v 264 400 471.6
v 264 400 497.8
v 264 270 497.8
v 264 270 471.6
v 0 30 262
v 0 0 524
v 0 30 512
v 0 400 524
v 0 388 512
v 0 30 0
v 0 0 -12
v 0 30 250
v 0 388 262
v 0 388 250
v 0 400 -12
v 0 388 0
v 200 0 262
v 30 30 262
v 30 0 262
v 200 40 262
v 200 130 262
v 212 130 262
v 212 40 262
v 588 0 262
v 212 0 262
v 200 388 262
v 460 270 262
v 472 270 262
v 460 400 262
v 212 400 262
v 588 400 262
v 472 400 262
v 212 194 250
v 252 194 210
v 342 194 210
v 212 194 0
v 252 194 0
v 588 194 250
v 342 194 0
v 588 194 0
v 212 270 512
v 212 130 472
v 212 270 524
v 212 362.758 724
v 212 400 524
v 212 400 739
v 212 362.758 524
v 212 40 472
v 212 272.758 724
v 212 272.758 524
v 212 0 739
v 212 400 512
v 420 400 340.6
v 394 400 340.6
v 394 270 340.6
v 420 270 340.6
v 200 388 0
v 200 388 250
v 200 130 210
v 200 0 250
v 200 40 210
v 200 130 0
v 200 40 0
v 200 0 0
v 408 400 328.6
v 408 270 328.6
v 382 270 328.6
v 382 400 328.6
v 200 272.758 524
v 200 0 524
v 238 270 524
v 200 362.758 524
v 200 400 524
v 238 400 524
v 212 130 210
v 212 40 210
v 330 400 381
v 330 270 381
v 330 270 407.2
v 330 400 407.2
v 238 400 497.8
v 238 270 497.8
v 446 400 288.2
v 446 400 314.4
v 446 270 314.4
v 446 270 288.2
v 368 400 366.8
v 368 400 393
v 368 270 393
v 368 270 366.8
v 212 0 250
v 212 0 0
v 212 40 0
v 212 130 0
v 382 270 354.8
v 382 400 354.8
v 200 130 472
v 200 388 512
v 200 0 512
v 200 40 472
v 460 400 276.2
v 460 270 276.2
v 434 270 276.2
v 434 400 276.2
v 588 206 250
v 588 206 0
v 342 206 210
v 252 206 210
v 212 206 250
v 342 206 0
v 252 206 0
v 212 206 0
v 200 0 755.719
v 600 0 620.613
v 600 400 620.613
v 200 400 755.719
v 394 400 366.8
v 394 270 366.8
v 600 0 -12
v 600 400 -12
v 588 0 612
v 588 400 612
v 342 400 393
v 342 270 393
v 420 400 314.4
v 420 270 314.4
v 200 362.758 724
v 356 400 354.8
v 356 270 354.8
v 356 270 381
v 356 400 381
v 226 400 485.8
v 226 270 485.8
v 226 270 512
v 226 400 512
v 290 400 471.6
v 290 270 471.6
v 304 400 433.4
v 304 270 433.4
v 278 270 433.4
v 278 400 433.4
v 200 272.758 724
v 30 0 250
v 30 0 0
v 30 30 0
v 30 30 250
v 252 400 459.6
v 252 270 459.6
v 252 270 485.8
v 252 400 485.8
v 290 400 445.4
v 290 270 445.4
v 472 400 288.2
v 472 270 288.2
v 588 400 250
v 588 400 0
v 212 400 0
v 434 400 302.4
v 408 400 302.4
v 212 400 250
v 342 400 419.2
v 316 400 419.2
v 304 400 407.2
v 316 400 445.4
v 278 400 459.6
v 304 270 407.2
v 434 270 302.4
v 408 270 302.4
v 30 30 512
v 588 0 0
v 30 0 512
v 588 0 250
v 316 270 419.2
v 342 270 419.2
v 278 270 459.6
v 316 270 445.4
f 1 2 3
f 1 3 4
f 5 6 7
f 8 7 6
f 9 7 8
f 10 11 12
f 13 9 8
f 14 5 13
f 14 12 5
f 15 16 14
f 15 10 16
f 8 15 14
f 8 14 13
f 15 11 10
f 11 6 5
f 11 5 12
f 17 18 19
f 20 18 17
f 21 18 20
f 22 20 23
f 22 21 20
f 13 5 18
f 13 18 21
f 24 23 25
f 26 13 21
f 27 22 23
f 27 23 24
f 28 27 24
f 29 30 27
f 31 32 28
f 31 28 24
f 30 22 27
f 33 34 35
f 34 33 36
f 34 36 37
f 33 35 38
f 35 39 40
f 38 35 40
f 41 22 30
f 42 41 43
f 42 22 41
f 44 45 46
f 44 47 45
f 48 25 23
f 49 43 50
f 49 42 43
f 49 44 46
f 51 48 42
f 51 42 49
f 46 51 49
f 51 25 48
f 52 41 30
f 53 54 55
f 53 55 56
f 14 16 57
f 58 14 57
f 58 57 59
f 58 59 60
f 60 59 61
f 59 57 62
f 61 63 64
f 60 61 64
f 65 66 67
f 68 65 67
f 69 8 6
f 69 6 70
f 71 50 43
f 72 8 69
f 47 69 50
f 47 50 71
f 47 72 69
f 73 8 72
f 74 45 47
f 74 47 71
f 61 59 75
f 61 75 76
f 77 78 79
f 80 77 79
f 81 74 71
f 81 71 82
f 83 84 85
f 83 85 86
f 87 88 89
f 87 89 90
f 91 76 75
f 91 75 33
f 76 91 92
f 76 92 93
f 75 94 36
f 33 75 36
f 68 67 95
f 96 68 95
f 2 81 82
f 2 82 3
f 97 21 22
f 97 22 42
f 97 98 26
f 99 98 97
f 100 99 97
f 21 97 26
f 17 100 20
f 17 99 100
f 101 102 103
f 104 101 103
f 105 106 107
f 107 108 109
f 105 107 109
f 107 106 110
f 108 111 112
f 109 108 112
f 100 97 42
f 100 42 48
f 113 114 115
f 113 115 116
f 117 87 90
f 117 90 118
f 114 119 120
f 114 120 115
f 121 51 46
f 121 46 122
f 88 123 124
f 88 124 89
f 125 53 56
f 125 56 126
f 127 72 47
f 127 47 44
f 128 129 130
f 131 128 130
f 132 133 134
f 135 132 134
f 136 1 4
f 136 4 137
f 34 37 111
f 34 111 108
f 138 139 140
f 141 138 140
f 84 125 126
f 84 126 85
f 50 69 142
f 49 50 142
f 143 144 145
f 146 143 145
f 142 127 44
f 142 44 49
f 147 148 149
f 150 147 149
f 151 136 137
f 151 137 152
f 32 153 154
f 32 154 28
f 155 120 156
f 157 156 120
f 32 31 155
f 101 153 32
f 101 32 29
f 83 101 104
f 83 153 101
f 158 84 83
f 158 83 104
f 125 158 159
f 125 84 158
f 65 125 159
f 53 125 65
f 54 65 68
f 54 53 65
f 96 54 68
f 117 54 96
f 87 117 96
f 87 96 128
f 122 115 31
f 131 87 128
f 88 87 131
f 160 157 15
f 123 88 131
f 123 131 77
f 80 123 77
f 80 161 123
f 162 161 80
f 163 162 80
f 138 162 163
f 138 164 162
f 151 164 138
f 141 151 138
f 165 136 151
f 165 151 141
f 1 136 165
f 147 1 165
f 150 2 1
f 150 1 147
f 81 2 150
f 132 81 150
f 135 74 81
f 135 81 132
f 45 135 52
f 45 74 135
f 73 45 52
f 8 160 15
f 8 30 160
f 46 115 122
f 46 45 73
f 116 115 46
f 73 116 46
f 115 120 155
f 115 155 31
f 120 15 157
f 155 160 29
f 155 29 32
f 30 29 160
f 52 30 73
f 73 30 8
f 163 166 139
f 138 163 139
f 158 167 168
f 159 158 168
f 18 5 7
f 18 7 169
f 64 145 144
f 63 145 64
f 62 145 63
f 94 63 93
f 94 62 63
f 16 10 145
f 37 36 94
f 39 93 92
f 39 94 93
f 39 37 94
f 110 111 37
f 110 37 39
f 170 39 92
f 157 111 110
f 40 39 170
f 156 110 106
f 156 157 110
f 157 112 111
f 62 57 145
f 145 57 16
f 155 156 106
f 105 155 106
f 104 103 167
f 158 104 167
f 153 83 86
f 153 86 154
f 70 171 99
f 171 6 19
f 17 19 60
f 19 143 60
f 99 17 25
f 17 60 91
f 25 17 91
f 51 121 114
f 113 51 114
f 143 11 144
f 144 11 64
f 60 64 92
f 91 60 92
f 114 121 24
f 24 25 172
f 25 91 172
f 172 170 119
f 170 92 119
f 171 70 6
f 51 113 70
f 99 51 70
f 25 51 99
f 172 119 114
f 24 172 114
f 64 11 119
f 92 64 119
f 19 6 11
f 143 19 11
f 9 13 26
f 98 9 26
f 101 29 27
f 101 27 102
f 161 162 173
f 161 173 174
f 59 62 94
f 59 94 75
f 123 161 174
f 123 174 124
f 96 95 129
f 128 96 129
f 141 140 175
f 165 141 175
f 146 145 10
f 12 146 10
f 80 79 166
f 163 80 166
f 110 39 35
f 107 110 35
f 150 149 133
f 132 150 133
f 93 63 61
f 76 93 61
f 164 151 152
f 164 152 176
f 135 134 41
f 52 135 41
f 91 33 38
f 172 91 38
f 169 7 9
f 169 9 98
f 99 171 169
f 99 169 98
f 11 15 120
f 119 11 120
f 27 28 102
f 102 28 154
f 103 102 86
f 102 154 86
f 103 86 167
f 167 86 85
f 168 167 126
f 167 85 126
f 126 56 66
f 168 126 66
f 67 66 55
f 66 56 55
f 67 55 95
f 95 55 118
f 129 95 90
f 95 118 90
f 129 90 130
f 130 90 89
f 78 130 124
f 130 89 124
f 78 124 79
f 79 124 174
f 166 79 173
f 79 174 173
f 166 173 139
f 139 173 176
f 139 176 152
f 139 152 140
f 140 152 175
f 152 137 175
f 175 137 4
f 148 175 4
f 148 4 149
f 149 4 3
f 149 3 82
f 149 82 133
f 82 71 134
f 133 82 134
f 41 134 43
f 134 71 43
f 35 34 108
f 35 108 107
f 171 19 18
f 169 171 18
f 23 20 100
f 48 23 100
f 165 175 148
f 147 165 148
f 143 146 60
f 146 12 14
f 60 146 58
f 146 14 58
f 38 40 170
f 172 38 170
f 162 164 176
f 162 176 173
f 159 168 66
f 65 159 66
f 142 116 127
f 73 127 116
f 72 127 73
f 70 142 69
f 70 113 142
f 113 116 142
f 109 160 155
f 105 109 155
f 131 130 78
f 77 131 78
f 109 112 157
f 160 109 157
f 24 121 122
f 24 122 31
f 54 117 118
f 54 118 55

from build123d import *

# Parameters (mm, degrees)
F0_W      = 12
F0_H      = 358
F0_W_2    = 18
F0_H_2    = 18
F0_W_3    = 170
F0_H_3    = 12
F0_W_4    = 376
F0_H_4    = 182
F1_DEPTH  = 12
F2_DEPTH  = 250
F3_W      = 90
F3_H      = 210
F4_DEPTH  = 206.001
F5_W      = 90
F5_H      = 210
F6_DEPTH  = 25
F7_W      = 600
F7_H      = 400
F8_DEPTH  = 12
F11_DEPTH = 400
F12_W     = 90
F12_H     = 200
F12_H_2   = 210
F13_DEPTH = 20
F9_W      = 30
F9_H      = 30
F14_DEPTH = 250
F15_DEPTH = 250
F17_DEPTH = 130
F19_DEPTH = 160


with BuildPart() as f1:
    # F0 (on Top) → F1 (new body)
    with BuildSketch(Plane.XY):
        with Locations((6, 209)):
            Rectangle(F0_W, F0_H)
        Polygon((0, 400), (0, 388), (12, 388), (200, 388), (200, 400), align=None)
        Polygon((30, 30), (30, 12), (200, 12), (200, 388), (12, 388), (12, 30), align=None)
        Polygon((0, 30), (0, 0), (30, 0), (30, 12), (12, 12), (12, 30), align=None)
        with Locations((21, 21)):
            Rectangle(F0_W_2, F0_H_2)
        with Locations((115, 6)):
            Rectangle(F0_W_3, F0_H_3)
        Polygon((200, 388), (200, 12), (212, 12), (212, 194), (212, 206), (212, 388), align=None)
        with Locations((206, 6)):
            Rectangle(F0_W, F0_H_3)
        with Locations((400, 6)):
            Rectangle(F0_W_4, F0_H_3)
        with Locations((400, 103)):
            Rectangle(F0_W_4, F0_H_4)
        with Locations((400, 200)):
            Rectangle(F0_W_4, F0_H_3)
        with Locations((400, 297)):
            Rectangle(F0_W_4, F0_H_4)
        with Locations((400, 394)):
            Rectangle(F0_W_4, F0_H_3)
        with Locations((594, 200)):
            Rectangle(F0_W, F0_H_3)
        with Locations((206, 394)):
            Rectangle(F0_W, F0_H_3)
        Polygon((588, 400), (588, 388), (588, 206), (600, 206), (600, 400), align=None)
        Polygon((588, 12), (588, 0), (600, 0), (600, 194), (588, 194), align=None)
    extrude(amount=-F1_DEPTH)

    # F0 (on Top) → F2 (join)
    with BuildSketch(Plane.XY):
        Polygon((0, 400), (0, 388), (12, 388), (200, 388), (200, 400), align=None)
        with Locations((206, 394)):
            Rectangle(F0_W, F0_H_3)
        Polygon((200, 388), (200, 12), (212, 12), (212, 194), (212, 206), (212, 388), align=None)
        with Locations((206, 6)):
            Rectangle(F0_W, F0_H_3)
        with Locations((21, 21)):
            Rectangle(F0_W_2, F0_H_2)
        Polygon((0, 30), (0, 0), (30, 0), (30, 12), (12, 12), (12, 30), align=None)
        with Locations((400, 200)):
            Rectangle(F0_W_4, F0_H_3)
        with Locations((594, 200)):
            Rectangle(F0_W, F0_H_3)
        Polygon((588, 400), (588, 388), (588, 206), (600, 206), (600, 400), align=None)
        Polygon((588, 12), (588, 0), (600, 0), (600, 194), (588, 194), align=None)
    extrude(amount=F2_DEPTH)

    # F3 (on face) → F4 (cut, through all)
    with BuildSketch(Plane.XZ.offset(-194)):
        with Locations((297, 105)):
            Rectangle(F3_W, F3_H)
    extrude(amount=-F4_DEPTH, mode=Mode.SUBTRACT)

    # F5 (on face) → F6 (cut)
    with BuildSketch(Plane(origin=(200, 0, 0), x_dir=(0, -1, 0), z_dir=(-1, 0, 0))):
        with Locations((-85, 105)):
            Rectangle(F5_W, F5_H)
    extrude(amount=-F6_DEPTH, mode=Mode.SUBTRACT)

    # F7 (on face) → F8 (join)
    with BuildSketch(Plane.XY.offset(250)):
        with Locations((300, 200)):
            Rectangle(F7_W, F7_H)
    extrude(amount=F8_DEPTH)

    # F10 (on face) → F11 (join)
    with BuildSketch(Plane.XZ):
        Polygon((0, 524), (0, 512), (12, 512), (200, 512), (200, 262), (212, 262), (212, 524), (212, 739), (588, 612), (588, 262), (600, 262), (600, 620.6128402984), (200, 755.7192232772), (200, 524), align=None)
    extrude(amount=-F11_DEPTH)

    # F12 (on face) → F13 (cut)
    with BuildSketch(Plane(origin=(200, 0, 0), x_dir=(0, -1, 0), z_dir=(-1, 0, 0))):
        with Locations((-317.7582192421, 624)):
            Rectangle(F12_W, F12_H)
        with Locations((-85, 367)):
            Rectangle(F12_W, F12_H_2)
    extrude(amount=-F13_DEPTH, mode=Mode.SUBTRACT)

    # F9 (on face) → F14 (join)
    with BuildSketch(Plane.XY.offset(262)):
        with Locations((15, 15)):
            Rectangle(F9_W, F9_H)
    extrude(amount=F14_DEPTH)

    # F9 (on face) → F15 (join)
    with BuildSketch(Plane.XY.offset(262)):
        Polygon((212, 400), (0, 400), (0, 388), (200, 388), (212, 388), align=None)
    extrude(amount=F15_DEPTH)

    # F16 (on face) → F17 (join)
    with BuildSketch(Plane(origin=(0, 400, 0), x_dir=(-1, 0, 0), z_dir=(0, 1, 0))):
        Polygon((-212, 262), (-212, 524), (-238, 524), (-238, 497.8), (-264, 497.8), (-264, 471.6), (-290, 471.6), (-290, 445.4), (-316, 445.4), (-316, 419.2), (-342, 419.2), (-342, 393), (-368, 393), (-368, 366.8), (-394, 366.8), (-394, 340.6), (-420, 340.6), (-420, 314.4), (-446, 314.4), (-446, 288.2), (-472, 288.2), (-472, 262), align=None)
    extrude(amount=-F17_DEPTH)

    # F18 (on face) → F19 (cut)
    with BuildSketch(Plane.XZ.offset(-270)):
        Polygon((212, 262), (460, 262), (460, 276.2), (434, 276.2), (434, 302.4), (408, 302.4), (408, 328.6), (382, 328.6), (382, 354.8), (356, 354.8), (356, 381), (330, 381), (330, 407.2), (304, 407.2), (304, 433.4), (278, 433.4), (278, 459.6), (252, 459.6), (252, 485.8), (226, 485.8), (226, 512), (212, 512), align=None)
    extrude(amount=-F19_DEPTH, mode=Mode.SUBTRACT)


solid = f1.part
